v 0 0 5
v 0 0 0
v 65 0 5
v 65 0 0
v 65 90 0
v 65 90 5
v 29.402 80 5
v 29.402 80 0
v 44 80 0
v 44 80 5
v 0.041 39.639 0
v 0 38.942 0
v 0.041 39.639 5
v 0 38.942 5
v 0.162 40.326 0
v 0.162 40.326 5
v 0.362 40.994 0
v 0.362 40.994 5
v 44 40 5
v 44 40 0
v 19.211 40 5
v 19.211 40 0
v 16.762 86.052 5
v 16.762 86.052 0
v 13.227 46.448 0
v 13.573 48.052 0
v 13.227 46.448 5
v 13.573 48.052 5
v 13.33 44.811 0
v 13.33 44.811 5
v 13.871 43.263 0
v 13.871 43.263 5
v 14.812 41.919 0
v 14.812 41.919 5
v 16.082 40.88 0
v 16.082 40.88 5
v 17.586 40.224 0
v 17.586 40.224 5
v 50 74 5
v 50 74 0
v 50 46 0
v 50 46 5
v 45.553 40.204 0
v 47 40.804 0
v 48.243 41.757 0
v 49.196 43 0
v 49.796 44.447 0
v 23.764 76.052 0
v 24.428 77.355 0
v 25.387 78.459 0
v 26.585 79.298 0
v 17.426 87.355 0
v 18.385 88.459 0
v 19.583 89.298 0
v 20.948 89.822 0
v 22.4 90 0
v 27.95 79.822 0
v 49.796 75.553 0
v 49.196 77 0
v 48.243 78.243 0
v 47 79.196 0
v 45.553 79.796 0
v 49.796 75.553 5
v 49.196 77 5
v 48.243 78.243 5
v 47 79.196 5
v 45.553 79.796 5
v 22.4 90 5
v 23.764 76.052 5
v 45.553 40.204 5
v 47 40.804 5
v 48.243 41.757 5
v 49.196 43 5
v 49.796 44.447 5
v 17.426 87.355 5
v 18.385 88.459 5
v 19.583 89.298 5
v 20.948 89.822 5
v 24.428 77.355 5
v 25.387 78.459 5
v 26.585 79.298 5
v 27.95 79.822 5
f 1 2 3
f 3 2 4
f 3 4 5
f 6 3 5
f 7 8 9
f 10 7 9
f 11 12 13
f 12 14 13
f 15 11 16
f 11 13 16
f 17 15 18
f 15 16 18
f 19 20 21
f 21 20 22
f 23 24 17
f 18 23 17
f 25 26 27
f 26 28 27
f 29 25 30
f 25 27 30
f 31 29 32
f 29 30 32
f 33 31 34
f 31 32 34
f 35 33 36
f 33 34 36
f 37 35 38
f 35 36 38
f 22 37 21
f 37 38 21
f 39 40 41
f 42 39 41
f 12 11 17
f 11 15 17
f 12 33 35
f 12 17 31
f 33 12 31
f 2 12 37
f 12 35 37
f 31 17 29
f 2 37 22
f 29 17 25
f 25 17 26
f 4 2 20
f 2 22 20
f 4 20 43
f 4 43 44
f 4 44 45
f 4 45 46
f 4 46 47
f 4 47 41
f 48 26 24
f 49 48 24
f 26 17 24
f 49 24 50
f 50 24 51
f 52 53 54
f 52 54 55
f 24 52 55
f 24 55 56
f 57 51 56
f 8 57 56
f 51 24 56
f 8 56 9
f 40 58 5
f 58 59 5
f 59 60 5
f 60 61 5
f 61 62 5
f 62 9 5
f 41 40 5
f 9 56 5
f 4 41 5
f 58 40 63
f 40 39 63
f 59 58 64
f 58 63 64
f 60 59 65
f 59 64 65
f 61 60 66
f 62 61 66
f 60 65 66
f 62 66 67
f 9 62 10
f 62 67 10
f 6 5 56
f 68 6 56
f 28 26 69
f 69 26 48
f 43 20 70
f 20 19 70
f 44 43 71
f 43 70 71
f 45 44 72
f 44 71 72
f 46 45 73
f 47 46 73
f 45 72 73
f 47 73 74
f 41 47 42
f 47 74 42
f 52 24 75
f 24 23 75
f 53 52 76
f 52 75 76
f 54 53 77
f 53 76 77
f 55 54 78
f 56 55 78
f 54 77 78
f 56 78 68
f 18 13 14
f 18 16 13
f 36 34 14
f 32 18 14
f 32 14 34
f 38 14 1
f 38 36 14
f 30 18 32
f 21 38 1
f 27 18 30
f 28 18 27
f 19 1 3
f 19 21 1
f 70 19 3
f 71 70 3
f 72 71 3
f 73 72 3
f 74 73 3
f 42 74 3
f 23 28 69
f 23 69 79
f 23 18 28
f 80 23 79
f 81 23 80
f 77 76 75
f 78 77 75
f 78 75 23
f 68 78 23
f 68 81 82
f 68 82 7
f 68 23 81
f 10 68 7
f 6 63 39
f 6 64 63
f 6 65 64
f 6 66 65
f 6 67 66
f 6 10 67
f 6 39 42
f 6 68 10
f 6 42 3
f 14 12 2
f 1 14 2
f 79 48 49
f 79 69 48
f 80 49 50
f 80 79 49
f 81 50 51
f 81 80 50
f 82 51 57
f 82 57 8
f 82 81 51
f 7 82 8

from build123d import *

# Parameters (mm, degrees)
BOSS_EXTRU_1_DEPTH           = 5
ENL_V_MAT_EXTRU_1_DEPTH      = 112.130553854
ENL_V_MAT_EXTRU_1_DEPTH_BACK = 112.130553854
CONG_1_R                     = 6


with BuildPart() as part:
    # Esquisse1 → Boss.-Extru.1 (new body)
    with BuildSketch(Plane.XY):
        Polygon((0, 0), (65, 0), (65, 90), (18.198511713, 90), (0, 40), align=None)
    extrude(amount=BOSS_EXTRU_1_DEPTH)

    # Esquisse2 → Enlèv. mat.-Extru.1 (cut, two sides: drawn at the far end of the back side and taken through both)
    with BuildSketch(Plane.XY.offset(5).offset(-ENL_V_MAT_EXTRU_1_DEPTH_BACK)):
        Polygon((10.641777725, 40), (25.200587095, 80), (50, 80), (50, 40), align=None)
    extrude(amount=ENL_V_MAT_EXTRU_1_DEPTH + ENL_V_MAT_EXTRU_1_DEPTH_BACK, mode=Mode.SUBTRACT)

    # Congé1
    cong_1_edges = [part.edges().sort_by_distance(p)[0] for p in [
        (50, 40, 2.5),
        (10.641777725, 40, 2.5),
        (25.200587095, 80, 2.5),
        (50, 80, 2.5),
        (0, 40, 2.5),
        (18.198511713, 90, 2.5),
    ]]
    fillet(cong_1_edges, radius=CONG_1_R)


solid = part.part
